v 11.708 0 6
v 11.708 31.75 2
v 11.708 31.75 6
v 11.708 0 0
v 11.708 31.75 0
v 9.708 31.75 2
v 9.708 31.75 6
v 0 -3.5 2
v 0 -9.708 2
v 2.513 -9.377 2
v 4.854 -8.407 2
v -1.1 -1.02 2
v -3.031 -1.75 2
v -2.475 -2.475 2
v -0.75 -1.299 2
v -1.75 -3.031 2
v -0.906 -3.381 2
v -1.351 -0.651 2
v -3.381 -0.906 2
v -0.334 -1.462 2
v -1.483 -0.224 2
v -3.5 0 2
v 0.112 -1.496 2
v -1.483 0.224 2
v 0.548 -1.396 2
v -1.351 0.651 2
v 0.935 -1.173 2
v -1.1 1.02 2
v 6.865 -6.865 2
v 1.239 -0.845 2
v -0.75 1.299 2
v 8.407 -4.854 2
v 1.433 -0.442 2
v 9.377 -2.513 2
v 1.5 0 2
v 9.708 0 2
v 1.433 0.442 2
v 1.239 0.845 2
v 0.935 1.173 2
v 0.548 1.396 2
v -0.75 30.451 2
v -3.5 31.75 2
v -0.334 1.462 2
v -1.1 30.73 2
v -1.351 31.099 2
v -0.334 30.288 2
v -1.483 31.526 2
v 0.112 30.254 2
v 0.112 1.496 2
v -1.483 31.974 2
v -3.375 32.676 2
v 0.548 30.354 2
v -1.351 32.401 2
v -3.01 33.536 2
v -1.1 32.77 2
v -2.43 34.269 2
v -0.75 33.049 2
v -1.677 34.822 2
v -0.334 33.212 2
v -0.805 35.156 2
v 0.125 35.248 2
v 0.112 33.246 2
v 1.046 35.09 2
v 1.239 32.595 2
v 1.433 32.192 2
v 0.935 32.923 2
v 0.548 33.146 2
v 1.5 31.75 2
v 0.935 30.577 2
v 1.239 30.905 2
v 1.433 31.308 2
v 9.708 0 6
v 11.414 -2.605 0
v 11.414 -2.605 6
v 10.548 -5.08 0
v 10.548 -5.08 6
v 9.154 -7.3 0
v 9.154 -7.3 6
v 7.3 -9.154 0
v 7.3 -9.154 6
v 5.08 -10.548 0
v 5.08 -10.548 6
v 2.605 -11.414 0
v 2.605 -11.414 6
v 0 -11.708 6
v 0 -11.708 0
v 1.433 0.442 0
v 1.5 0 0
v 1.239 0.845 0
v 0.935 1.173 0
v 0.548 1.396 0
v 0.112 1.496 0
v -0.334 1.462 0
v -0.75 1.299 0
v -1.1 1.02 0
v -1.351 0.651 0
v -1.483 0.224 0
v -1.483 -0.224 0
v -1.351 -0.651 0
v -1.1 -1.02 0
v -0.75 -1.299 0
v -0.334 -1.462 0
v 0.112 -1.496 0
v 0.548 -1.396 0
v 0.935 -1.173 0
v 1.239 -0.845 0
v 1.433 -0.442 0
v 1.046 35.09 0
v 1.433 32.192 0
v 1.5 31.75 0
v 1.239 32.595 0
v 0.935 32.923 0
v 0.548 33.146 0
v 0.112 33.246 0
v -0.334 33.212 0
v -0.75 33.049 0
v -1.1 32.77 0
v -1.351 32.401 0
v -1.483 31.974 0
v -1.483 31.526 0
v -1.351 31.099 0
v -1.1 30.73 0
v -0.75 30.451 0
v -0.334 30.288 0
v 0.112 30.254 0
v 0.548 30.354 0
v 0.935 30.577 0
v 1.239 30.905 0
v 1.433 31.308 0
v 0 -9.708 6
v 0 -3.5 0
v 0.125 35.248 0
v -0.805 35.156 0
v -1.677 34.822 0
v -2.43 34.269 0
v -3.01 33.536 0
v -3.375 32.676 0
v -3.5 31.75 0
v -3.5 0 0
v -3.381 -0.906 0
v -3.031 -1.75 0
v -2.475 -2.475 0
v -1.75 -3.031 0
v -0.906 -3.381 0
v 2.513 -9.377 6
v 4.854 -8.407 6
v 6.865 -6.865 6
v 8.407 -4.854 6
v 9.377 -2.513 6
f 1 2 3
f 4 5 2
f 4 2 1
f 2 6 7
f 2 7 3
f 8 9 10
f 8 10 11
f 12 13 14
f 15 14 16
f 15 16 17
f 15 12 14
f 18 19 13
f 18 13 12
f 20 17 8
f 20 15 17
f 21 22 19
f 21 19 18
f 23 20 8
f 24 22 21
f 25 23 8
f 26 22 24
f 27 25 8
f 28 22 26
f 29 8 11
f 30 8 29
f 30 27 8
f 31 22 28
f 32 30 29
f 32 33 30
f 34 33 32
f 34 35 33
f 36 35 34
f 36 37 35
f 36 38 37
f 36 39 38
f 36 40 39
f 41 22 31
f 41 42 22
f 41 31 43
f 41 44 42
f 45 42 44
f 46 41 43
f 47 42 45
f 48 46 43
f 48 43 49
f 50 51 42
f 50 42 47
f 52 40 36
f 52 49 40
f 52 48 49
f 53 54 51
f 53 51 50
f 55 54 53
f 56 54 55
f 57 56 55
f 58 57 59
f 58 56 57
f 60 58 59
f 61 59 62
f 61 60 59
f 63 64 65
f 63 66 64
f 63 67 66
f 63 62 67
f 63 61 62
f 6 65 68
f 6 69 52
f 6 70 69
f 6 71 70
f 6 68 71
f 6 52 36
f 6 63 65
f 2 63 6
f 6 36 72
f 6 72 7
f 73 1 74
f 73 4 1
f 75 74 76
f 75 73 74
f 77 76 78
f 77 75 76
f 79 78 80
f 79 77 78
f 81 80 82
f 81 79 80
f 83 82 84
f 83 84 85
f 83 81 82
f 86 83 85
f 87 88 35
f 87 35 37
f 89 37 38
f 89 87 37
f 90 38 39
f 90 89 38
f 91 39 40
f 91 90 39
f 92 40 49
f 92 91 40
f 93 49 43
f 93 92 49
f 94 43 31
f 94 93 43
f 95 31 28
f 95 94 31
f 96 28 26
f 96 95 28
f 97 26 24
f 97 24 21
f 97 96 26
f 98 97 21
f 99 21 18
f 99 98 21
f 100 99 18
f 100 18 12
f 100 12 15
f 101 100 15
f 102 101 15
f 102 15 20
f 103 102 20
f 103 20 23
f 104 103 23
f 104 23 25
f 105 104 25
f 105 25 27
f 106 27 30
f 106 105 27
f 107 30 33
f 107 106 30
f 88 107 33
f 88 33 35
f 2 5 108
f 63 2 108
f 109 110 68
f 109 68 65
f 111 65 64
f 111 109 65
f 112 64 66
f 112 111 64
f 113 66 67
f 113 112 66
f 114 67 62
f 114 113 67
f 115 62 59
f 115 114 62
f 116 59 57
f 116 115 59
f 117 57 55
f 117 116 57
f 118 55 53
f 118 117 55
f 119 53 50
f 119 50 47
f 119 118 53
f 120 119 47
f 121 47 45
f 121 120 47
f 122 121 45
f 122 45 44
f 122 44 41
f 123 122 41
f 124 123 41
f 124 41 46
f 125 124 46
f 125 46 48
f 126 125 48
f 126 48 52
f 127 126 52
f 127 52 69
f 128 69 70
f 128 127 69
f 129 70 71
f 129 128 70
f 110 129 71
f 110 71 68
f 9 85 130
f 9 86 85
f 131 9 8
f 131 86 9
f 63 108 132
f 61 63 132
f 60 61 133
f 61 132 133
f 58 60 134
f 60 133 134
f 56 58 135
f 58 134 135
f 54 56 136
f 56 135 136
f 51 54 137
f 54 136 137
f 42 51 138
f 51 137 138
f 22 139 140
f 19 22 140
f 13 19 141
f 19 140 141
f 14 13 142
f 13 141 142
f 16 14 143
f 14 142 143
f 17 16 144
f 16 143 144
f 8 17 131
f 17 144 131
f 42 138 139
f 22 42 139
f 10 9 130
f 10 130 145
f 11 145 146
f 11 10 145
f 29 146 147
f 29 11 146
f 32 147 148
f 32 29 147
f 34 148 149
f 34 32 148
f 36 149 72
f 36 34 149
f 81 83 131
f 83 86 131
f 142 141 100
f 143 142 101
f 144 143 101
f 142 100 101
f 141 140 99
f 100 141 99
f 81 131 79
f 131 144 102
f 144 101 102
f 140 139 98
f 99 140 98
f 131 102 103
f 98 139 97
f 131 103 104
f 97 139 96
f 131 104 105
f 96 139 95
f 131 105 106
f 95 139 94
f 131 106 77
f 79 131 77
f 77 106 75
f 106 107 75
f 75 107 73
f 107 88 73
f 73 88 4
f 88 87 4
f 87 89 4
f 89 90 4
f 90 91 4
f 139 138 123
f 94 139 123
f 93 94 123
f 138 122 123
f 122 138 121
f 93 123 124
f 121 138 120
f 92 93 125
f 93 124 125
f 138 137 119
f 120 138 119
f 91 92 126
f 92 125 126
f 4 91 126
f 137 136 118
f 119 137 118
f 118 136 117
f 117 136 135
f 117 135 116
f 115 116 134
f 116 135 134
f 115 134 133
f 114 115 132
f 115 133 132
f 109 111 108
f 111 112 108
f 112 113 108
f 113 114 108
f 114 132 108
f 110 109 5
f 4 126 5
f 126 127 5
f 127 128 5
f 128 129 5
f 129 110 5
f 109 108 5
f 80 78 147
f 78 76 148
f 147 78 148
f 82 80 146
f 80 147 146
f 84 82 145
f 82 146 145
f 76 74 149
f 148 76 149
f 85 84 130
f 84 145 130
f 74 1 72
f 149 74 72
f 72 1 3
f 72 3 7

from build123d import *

# Parameters (mm, degrees)
SKETCH1_R           = 3.5
SKETCH1_R_2         = 1.5
BOSS_EXTRUDE1_DEPTH = 2
BOSS_EXTRUDE2_START = 2
BOSS_EXTRUDE2_DEPTH = 4


with BuildPart() as part:
    # Sketch1 → Boss-Extrude1 (new body)
    with BuildSketch(Plane.XY):
        with BuildLine():
            Line((9.70788, 31.75), (11.70788, 31.75))
            Line((11.70788, 31.75), (1.046303857, 35.089947341))
            ThreePointArc((1.046303857, 35.089947341), (2.820643854, 33.822189241), (3.5, 31.75))
            ThreePointArc((3.5, 31.75), (0, 28.25), (-3.5, 31.75))
            Line((-3.5, 31.75), (-3.5, 0))
            ThreePointArc((-3.5, 0), (0, 3.5), (3.5, 0))
            ThreePointArc((3.5, 0), (2.474873734, -2.474873734), (0, -3.5))
            Line((0, -3.5), (0, -9.70788))
            ThreePointArc((0, -9.70788), (6.864507779, -6.864507779), (9.70788, 0))
            Line((9.70788, 0), (9.70788, 31.75))
        make_face()
        with Locations((0, 31.75)):
            Circle(SKETCH1_R)
        with Locations((0, 31.75)):
            Circle(SKETCH1_R_2, mode=Mode.SUBTRACT)
        Circle(SKETCH1_R)
        Circle(SKETCH1_R_2, mode=Mode.SUBTRACT)
        with BuildLine():
            ThreePointArc((0, -9.70788), (6.864507779, -6.864507779), (9.70788, 0))
            Line((9.70788, 0), (9.70788, 31.75))
            Line((9.70788, 31.75), (11.70788, 31.75))
            Line((11.70788, 31.75), (11.70788, 0))
            ThreePointArc((11.70788, 0), (8.278721341, -8.278721341), (0, -11.70788))
            Line((0, -11.70788), (0, -9.70788))
        make_face()
    extrude(amount=BOSS_EXTRUDE1_DEPTH)

    # Sketch1<3> → Boss-Extrude2 (add)
    with BuildSketch(Plane.XY.offset(BOSS_EXTRUDE2_START)):
        with BuildLine():
            ThreePointArc((0, -9.70788), (6.864507779, -6.864507779), (9.70788, 0))
            Line((9.70788, 0), (9.70788, 31.75))
            Line((9.70788, 31.75), (11.70788, 31.75))
            Line((11.70788, 31.75), (11.70788, 0))
            ThreePointArc((11.70788, 0), (8.278721341, -8.278721341), (0, -11.70788))
            Line((0, -11.70788), (0, -9.70788))
        make_face()
    extrude(amount=BOSS_EXTRUDE2_DEPTH)


solid = part.part
